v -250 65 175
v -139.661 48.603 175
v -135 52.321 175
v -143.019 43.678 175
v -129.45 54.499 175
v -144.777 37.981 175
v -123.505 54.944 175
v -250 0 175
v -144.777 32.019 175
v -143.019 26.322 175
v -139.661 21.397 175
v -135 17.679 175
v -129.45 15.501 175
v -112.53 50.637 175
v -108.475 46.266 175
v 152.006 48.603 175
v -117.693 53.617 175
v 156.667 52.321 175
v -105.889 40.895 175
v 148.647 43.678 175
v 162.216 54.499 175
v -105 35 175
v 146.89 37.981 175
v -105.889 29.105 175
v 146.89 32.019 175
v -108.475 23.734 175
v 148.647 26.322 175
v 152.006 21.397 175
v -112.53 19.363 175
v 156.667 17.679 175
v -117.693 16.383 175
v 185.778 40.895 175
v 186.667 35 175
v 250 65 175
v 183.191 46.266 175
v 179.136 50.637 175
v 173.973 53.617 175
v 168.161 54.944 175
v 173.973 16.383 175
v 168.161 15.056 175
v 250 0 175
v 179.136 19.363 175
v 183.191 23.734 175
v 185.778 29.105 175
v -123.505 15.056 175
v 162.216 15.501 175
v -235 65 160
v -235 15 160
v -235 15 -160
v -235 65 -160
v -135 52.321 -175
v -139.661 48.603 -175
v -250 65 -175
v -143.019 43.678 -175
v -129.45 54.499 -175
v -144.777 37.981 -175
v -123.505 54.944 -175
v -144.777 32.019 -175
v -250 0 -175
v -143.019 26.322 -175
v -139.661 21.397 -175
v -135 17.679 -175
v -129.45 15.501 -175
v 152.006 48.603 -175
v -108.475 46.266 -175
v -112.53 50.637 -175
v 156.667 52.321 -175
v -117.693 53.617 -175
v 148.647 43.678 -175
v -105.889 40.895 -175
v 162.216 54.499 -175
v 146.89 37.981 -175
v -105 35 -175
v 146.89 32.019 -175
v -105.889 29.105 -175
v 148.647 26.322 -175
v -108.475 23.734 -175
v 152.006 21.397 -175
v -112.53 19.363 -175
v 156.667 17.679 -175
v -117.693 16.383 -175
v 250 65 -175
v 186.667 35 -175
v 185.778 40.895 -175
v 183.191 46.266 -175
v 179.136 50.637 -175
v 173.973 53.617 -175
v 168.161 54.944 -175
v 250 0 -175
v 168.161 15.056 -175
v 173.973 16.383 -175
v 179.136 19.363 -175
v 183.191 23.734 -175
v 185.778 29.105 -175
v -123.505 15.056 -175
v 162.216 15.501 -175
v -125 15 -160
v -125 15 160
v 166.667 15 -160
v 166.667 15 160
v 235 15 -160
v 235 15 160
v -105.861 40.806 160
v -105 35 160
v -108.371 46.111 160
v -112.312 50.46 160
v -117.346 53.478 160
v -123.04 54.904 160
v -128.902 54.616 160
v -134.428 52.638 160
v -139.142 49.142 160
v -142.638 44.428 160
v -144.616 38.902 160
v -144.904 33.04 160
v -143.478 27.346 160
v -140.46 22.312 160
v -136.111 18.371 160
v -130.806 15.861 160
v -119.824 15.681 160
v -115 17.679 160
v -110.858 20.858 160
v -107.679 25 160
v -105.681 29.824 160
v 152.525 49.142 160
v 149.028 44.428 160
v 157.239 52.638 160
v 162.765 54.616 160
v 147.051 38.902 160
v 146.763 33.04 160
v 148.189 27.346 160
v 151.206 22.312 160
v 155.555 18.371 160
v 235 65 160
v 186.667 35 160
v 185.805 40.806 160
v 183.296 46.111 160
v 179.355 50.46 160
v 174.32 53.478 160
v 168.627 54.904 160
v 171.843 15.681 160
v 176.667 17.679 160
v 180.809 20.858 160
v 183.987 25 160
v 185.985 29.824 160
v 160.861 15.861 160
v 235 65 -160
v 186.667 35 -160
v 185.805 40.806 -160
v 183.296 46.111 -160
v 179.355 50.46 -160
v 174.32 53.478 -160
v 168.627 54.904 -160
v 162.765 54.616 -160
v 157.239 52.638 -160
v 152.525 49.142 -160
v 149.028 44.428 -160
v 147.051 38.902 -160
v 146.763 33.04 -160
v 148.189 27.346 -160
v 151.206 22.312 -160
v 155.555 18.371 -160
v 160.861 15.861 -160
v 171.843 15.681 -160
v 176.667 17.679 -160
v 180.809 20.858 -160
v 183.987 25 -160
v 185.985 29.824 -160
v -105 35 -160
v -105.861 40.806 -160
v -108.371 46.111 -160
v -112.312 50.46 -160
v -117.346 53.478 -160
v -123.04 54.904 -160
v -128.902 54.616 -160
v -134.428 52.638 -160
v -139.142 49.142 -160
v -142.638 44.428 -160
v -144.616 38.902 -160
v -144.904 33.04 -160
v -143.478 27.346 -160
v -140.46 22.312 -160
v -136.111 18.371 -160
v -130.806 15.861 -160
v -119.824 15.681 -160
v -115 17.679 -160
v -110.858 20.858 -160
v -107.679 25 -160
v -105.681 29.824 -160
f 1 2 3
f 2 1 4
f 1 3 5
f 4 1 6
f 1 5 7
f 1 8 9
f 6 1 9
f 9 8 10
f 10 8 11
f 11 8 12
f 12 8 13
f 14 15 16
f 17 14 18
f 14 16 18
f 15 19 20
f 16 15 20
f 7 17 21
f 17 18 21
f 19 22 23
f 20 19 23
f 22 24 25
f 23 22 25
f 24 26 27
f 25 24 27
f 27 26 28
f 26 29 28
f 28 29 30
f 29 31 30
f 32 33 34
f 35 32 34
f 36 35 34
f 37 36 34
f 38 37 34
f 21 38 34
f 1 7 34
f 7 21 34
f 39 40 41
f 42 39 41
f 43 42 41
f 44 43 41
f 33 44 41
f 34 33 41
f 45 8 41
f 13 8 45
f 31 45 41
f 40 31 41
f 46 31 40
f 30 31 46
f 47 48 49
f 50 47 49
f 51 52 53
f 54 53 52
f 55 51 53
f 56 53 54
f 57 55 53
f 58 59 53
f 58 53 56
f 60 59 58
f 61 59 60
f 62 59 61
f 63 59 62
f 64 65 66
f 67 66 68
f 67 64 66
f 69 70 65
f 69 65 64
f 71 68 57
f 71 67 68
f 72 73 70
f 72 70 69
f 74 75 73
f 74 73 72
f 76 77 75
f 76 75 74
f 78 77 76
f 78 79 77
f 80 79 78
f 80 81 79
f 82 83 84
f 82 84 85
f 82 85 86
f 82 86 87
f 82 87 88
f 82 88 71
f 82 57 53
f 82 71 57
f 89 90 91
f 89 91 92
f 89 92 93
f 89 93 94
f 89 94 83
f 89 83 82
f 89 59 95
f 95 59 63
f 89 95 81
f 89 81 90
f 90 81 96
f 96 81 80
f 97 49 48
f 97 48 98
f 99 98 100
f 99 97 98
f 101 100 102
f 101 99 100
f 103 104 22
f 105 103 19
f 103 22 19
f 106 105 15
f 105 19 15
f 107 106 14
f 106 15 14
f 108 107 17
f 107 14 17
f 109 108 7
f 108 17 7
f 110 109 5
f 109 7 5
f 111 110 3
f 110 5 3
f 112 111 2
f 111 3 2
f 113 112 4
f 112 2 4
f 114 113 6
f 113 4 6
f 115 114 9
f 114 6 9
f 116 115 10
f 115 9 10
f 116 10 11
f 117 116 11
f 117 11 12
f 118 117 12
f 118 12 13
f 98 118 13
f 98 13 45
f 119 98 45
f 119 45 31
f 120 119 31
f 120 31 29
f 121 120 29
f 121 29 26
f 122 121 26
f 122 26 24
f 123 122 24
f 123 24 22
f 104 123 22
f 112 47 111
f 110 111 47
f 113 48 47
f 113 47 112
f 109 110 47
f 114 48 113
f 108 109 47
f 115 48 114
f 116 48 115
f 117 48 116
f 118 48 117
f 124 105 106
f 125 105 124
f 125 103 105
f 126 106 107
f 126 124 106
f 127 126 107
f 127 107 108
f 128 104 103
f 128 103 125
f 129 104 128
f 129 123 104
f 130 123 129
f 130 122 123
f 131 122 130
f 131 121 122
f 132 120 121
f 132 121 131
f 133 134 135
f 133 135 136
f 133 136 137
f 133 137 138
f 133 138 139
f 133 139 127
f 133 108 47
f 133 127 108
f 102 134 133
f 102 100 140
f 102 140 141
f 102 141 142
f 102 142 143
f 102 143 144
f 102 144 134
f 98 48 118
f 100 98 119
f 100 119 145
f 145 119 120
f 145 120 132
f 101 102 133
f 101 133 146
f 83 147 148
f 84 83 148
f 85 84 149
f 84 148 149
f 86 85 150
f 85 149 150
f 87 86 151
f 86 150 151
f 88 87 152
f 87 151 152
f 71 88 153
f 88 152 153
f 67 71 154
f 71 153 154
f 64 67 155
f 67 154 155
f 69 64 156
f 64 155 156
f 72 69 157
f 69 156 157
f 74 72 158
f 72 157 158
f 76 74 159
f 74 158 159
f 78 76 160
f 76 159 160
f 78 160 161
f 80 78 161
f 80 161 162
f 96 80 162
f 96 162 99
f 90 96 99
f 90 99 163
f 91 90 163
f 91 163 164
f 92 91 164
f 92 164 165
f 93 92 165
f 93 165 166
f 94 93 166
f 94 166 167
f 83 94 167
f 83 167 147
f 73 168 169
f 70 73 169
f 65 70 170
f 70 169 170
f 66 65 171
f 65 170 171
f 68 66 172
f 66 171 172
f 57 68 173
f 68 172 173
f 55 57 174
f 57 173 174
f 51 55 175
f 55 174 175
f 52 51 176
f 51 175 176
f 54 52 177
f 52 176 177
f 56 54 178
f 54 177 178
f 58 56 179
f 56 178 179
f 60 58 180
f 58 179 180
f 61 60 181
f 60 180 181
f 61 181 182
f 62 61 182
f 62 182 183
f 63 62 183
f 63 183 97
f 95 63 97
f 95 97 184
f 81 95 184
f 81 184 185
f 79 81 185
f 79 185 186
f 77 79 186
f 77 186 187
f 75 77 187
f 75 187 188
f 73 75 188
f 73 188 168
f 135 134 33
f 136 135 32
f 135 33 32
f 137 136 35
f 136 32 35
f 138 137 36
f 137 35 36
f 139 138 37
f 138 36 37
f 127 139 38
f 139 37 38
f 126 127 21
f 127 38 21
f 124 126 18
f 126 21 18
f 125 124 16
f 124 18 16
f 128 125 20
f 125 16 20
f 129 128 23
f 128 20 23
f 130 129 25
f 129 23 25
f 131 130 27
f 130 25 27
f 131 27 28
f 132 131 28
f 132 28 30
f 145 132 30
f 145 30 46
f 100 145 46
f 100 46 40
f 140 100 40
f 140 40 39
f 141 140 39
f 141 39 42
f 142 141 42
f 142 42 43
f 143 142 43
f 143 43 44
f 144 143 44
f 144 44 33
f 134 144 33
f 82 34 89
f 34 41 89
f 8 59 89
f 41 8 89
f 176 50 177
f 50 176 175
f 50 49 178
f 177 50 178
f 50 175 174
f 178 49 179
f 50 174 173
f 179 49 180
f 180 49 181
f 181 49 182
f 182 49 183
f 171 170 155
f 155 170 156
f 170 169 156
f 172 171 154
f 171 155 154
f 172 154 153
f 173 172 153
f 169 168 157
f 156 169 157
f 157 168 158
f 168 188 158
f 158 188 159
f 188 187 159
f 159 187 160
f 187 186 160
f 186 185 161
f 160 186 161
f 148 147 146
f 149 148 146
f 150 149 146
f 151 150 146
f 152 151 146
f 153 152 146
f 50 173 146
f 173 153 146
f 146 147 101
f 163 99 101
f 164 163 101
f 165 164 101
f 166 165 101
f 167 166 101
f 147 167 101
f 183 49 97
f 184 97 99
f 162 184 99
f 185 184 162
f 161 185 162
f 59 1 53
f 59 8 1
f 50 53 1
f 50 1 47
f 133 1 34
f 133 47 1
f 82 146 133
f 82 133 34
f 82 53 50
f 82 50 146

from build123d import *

# Parameters (mm, degrees)
CROQUIS1_W              = 500
CROQUIS1_H              = 350
SALIENTE_EXTRUIR1_DEPTH = 15
CROQUIS2_W              = 500
CROQUIS2_H              = 350
CROQUIS2_W_2            = 470
CROQUIS2_H_2            = 320
SALIENTE_EXTRUIR2_DEPTH = 50
CROQUIS3_R              = 20
CORTAR_EXTRUIR1_DEPTH   = 351


with BuildPart() as part:
    # Croquis1 → Saliente-Extruir1 (new body)
    with BuildSketch(Plane(origin=(0, 0, 0), x_dir=(1, 0, 0), z_dir=(0, 1, 0))):
        Rectangle(CROQUIS1_W, CROQUIS1_H)
    extrude(amount=SALIENTE_EXTRUIR1_DEPTH)

    # Croquis2 → Saliente-Extruir2 (add)
    with BuildSketch(Plane(origin=(0, 15, 0), x_dir=(1, 0, 0), z_dir=(0, 1, 0))):
        Rectangle(CROQUIS2_W, CROQUIS2_H)
        Rectangle(CROQUIS2_W_2, CROQUIS2_H_2, mode=Mode.SUBTRACT)
    extrude(amount=SALIENTE_EXTRUIR2_DEPTH)

    # Croquis3 → Cortar-Extruir1 (cut, through all)
    with BuildSketch(Plane.XY.offset(175)):
        with Locations((-125, 35)):
            Circle(CROQUIS3_R)
        with Locations((166.666666667, 35)):
            Circle(CROQUIS3_R)
    extrude(amount=-CORTAR_EXTRUIR1_DEPTH, mode=Mode.SUBTRACT)


solid = part.part
